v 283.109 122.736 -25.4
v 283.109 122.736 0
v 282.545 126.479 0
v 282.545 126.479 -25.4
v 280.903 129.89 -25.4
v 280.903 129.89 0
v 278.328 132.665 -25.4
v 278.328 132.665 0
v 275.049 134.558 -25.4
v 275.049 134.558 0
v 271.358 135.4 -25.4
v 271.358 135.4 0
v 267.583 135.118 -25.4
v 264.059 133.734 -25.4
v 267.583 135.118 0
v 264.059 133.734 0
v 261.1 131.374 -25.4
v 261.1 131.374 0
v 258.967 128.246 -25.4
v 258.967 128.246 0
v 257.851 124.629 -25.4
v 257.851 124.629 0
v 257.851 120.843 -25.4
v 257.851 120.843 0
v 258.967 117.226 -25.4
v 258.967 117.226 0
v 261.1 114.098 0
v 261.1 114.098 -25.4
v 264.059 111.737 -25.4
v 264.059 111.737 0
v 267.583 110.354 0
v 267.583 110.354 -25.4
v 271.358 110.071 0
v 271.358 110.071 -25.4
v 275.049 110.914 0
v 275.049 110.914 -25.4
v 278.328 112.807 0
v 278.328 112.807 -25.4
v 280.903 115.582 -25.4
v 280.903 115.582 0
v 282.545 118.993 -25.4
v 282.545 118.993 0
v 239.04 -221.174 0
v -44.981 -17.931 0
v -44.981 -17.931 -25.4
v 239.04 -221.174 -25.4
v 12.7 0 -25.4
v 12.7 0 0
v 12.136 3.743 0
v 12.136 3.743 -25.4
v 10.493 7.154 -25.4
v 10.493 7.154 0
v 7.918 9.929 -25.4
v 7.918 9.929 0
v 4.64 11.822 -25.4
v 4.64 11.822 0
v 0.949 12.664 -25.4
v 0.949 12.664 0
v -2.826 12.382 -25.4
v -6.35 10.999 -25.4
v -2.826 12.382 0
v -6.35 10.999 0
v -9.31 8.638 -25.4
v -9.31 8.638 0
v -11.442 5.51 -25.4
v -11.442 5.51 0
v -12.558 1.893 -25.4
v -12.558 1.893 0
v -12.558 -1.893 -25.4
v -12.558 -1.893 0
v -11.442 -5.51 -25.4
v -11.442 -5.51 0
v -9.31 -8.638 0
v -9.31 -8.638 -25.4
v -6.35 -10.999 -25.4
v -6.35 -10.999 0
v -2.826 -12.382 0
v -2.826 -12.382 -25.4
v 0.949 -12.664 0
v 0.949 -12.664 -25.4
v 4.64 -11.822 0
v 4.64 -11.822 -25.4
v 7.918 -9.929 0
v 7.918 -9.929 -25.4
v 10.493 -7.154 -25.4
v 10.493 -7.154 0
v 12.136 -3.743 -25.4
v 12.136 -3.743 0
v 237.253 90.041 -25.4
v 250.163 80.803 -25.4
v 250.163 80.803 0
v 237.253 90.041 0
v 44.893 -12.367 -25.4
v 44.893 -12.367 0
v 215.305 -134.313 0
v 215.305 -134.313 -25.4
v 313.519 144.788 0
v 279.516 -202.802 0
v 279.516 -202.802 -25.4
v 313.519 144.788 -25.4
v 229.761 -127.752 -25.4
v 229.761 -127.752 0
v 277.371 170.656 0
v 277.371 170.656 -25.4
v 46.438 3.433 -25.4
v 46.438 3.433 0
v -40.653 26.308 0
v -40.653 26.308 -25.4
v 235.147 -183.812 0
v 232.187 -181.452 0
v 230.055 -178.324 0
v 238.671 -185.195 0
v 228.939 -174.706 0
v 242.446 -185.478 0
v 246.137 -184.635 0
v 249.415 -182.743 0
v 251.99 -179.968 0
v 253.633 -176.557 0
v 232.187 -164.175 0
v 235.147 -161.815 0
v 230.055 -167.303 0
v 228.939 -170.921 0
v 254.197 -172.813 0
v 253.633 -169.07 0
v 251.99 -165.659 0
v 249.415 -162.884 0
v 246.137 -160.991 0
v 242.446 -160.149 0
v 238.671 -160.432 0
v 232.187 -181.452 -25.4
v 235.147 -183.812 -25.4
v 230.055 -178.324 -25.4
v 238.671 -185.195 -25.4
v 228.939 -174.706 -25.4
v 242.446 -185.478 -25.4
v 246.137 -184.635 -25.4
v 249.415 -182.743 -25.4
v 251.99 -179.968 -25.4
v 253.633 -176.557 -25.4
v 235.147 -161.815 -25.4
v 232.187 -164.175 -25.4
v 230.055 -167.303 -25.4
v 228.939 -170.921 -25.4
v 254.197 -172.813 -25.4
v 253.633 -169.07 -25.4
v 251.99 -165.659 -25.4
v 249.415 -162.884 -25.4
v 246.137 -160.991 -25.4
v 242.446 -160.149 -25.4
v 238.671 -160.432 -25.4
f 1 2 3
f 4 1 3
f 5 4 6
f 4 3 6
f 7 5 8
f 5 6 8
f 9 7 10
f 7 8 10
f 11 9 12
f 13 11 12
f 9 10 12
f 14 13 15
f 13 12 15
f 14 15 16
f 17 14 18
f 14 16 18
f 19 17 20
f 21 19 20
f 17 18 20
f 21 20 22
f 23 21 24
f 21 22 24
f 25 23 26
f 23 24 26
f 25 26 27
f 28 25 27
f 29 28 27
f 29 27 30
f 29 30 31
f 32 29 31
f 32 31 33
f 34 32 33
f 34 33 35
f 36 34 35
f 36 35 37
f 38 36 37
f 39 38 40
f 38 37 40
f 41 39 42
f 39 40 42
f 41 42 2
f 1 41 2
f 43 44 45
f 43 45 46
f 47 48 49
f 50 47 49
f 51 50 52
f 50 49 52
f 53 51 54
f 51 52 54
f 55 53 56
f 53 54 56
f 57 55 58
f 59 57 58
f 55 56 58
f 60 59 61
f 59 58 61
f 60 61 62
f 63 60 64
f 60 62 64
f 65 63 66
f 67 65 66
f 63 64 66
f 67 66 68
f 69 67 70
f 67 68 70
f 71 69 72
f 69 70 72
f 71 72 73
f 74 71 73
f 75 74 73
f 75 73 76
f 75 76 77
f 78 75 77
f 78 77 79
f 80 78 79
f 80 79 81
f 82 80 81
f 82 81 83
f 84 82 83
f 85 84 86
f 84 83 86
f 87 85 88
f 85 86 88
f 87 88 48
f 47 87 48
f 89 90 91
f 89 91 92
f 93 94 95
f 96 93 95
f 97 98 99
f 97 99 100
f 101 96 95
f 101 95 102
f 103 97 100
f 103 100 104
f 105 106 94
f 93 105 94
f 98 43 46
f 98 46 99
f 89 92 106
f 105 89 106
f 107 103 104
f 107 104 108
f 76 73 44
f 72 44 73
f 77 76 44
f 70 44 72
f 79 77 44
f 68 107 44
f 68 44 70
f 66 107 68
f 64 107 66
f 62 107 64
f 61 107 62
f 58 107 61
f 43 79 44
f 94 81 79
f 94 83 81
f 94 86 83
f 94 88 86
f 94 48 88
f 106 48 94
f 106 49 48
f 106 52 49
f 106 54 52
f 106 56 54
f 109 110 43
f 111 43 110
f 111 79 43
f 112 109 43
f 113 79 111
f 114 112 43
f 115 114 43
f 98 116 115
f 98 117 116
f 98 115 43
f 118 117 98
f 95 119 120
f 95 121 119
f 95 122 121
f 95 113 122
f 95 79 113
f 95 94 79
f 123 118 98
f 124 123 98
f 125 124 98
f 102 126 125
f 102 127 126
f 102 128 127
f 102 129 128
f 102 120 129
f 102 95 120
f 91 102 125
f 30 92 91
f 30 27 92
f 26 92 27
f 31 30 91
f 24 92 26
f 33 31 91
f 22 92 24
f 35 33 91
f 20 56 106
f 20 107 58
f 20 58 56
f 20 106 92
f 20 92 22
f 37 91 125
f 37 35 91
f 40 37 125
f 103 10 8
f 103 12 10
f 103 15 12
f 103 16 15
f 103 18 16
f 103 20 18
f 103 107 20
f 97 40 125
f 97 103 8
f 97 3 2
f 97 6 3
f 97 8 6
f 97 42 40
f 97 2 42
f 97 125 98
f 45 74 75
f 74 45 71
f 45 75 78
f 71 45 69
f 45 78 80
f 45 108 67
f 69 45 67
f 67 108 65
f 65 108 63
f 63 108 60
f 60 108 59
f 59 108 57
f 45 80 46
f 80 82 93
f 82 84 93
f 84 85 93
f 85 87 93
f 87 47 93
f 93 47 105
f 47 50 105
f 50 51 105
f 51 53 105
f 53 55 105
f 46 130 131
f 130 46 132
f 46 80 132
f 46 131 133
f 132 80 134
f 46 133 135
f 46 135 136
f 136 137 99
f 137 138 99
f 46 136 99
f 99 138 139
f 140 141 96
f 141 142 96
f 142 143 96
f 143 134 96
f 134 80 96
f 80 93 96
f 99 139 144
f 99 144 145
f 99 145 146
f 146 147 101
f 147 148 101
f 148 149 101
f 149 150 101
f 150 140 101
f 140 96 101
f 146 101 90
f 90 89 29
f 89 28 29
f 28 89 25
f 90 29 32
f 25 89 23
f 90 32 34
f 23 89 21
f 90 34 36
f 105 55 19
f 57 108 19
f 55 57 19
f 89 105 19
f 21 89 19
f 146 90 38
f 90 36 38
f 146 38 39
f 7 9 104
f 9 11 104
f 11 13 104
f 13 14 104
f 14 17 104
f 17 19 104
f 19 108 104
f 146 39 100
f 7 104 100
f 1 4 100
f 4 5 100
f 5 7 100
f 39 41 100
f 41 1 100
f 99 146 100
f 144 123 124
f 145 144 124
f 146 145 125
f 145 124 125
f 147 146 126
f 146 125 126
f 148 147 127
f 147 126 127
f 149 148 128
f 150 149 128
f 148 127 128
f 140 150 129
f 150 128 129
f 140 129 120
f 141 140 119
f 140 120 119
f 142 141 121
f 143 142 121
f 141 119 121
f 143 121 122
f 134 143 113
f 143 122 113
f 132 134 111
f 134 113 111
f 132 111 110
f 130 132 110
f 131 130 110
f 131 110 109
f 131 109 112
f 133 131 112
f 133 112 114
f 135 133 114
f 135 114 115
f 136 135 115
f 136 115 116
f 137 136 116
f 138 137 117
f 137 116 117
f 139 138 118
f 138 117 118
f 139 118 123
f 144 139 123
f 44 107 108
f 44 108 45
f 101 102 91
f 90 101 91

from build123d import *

# Parameters (mm, degrees)
SKETCH1_R      = 12.7
EXTRUDE1_DEPTH = 25.4


with BuildPart() as part:
    # Sketch1 → Extrude1 (new body)
    with BuildSketch(Plane.XY):
        Polygon((-44.980643346, -17.930846203), (239.040212224, -221.173843873), (279.515997466, -202.802308581), (313.519168805, 144.788466381), (277.371059915, 170.655756994), (-40.652966993, 26.307979701), align=None)
        Circle(SKETCH1_R, mode=Mode.SUBTRACT)
        with Locations((270.409306565, 122.735954077)):
            Circle(SKETCH1_R, mode=Mode.SUBTRACT)
        with Locations((241.497107471, -172.813351867)):
            Circle(SKETCH1_R, mode=Mode.SUBTRACT)
        Polygon((44.892749422, -12.367036283), (215.305262763, -134.312834884), (229.76090035, -127.75157228), (250.162803153, 80.802892697), (237.252764264, 90.041210773), (46.438348119, 3.432544398), align=None, mode=Mode.SUBTRACT)
    extrude(amount=-EXTRUDE1_DEPTH)


solid = part.part
